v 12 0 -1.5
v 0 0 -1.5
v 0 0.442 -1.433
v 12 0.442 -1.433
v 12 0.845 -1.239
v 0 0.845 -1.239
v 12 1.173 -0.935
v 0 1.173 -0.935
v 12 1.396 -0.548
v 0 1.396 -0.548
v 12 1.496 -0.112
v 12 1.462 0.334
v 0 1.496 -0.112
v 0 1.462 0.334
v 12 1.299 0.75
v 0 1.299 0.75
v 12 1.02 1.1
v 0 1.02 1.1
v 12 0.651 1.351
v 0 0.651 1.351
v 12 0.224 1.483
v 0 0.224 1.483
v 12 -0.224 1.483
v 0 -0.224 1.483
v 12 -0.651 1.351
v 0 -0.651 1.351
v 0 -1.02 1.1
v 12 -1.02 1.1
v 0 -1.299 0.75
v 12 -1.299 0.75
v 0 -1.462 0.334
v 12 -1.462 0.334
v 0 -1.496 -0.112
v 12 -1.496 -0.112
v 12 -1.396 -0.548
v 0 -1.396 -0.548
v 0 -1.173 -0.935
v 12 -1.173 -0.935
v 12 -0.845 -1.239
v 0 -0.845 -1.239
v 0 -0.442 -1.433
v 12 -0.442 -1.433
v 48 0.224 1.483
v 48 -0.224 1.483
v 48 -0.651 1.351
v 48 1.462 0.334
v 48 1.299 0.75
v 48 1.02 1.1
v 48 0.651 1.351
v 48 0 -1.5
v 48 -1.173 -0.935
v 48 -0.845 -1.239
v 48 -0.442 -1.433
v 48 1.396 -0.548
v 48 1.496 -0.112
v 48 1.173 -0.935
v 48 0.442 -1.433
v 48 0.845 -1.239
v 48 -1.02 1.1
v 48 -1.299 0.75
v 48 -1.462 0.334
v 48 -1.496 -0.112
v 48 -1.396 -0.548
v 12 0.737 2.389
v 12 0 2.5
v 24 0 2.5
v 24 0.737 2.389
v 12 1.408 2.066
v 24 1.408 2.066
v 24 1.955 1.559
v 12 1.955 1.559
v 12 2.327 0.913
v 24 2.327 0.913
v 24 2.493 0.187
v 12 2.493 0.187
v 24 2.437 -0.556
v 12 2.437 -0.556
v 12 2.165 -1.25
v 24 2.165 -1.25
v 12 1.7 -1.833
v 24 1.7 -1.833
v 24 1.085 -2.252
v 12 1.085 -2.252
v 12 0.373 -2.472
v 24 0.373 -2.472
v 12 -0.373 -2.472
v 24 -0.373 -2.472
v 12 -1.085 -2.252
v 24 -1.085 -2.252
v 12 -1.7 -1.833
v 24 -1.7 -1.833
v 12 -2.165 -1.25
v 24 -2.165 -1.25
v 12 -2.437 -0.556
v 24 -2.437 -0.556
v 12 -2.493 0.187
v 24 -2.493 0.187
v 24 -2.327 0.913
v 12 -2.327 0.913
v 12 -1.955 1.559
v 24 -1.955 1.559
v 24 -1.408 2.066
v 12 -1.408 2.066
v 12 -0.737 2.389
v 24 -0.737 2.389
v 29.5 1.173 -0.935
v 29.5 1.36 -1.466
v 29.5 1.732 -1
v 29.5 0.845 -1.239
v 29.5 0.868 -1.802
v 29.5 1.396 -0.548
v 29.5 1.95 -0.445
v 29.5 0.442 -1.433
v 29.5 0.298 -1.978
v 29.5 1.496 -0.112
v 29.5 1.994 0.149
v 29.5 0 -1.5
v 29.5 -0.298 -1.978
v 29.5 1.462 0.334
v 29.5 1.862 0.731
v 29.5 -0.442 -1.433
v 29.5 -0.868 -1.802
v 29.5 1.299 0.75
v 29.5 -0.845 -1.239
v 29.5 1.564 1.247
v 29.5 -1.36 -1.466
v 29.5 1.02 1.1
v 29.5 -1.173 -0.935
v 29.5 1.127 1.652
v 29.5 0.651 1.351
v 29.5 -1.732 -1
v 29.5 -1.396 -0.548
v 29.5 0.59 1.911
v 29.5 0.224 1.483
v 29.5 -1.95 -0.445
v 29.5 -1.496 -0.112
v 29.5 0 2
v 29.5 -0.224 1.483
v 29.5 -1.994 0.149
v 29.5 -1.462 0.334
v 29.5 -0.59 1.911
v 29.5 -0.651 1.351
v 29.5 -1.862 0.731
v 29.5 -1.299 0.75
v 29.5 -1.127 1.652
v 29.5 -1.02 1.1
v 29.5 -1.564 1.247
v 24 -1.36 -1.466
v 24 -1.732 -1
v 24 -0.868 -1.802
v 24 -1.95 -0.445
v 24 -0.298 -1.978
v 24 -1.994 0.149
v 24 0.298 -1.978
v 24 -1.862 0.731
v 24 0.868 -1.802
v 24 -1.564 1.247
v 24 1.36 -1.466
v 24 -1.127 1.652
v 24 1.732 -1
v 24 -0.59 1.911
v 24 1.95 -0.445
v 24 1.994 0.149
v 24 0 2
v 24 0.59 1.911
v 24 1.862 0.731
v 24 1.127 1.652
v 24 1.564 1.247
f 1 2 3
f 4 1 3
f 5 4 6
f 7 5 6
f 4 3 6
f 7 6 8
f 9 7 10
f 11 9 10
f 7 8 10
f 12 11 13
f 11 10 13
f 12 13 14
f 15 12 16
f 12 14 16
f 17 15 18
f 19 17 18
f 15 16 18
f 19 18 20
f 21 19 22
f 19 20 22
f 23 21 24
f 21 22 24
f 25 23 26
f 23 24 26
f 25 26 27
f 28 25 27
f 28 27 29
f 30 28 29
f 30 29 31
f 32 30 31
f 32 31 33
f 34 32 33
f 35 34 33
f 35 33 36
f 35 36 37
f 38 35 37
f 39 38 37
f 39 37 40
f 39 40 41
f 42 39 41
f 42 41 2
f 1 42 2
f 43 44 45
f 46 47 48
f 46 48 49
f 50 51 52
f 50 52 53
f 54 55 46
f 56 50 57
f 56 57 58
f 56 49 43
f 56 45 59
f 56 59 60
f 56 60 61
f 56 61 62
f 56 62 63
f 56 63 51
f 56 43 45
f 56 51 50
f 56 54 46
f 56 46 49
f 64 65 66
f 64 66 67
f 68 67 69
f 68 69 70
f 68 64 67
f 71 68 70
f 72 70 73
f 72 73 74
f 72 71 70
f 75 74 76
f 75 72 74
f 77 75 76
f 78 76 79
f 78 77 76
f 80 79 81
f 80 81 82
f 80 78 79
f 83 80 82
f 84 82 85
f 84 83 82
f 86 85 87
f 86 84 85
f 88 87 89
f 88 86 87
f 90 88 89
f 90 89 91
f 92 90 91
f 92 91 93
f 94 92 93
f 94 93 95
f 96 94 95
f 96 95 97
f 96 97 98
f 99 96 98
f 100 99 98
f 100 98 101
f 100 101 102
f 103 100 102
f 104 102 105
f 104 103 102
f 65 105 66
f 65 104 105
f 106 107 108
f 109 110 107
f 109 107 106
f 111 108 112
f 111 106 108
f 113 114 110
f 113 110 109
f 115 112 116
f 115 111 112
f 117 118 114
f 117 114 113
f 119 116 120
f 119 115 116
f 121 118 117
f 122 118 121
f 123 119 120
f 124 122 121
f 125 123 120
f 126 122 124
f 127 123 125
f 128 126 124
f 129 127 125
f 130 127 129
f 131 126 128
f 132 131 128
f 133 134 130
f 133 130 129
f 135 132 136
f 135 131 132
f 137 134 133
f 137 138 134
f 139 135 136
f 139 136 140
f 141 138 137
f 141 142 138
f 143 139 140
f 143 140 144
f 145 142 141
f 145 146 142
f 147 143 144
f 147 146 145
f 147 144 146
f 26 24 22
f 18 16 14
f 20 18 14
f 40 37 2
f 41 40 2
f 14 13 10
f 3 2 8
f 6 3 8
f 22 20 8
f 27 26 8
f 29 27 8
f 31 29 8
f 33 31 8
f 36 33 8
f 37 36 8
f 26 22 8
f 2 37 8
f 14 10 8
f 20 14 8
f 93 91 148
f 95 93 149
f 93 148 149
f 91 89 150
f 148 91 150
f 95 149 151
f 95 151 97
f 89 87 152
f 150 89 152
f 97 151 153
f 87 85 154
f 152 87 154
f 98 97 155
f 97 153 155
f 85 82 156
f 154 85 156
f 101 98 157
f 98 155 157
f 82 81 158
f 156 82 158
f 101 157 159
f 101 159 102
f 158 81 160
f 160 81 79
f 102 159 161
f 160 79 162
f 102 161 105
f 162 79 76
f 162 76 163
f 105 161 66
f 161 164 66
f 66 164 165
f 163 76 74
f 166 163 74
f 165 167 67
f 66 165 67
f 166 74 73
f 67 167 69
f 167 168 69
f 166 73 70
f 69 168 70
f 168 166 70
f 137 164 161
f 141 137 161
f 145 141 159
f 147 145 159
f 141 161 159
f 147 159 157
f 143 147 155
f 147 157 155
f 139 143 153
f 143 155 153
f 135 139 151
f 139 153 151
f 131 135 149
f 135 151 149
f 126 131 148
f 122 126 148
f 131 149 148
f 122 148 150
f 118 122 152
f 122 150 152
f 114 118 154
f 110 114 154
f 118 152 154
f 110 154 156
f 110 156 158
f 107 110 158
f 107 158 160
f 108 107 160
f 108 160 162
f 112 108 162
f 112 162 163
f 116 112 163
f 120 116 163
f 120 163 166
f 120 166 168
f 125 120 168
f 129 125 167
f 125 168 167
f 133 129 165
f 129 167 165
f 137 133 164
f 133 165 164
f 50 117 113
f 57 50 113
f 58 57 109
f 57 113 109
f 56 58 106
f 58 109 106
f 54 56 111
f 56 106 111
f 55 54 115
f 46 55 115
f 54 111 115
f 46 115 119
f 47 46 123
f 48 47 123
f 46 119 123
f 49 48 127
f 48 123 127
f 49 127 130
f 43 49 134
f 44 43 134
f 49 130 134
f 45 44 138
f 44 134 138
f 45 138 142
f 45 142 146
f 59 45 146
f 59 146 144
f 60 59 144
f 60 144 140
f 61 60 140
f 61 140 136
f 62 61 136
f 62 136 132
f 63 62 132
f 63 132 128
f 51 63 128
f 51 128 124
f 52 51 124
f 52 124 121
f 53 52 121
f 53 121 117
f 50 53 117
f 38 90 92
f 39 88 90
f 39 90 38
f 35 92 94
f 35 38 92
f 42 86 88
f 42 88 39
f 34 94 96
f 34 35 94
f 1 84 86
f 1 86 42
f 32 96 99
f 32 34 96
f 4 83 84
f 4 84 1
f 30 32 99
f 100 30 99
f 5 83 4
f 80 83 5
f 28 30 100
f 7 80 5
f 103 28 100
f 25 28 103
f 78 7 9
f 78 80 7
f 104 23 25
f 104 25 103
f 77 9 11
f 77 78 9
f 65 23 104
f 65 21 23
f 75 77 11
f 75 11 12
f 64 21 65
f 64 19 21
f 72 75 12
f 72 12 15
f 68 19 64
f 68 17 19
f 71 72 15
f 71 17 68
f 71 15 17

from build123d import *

# Parameters (mm, degrees)
SKETCH_1_R      = 1.5
EXTRUDE_1_DEPTH = 48
EXTRUDE_START   = -12
SKETCH_2_R      = 2.5
SKETCH_2_R_2    = 1.5
EXTRUDE_2_DEPTH = 12
EXTRUDE_START_2 = 24
SKETCH_3_R      = 2
SKETCH_3_R_2    = 1.5
EXTRUDE_3_DEPTH = 5.5


with BuildPart() as part:
    # 草图1 → 凸台-拉伸1 (new body)
    with BuildSketch(Plane(origin=(0, 0, 0), x_dir=(0, 0, -1), z_dir=(1, 0, 0))):
        Circle(SKETCH_1_R)
    extrude(amount=EXTRUDE_1_DEPTH)

    # 草图2 → 凸台-拉伸2 (add)
    with BuildSketch(Plane.ZY.offset(EXTRUDE_START)):
        Circle(SKETCH_2_R)
        Circle(SKETCH_2_R_2, mode=Mode.SUBTRACT)
    extrude(amount=-EXTRUDE_2_DEPTH)

    # 草图3 → 凸台-拉伸3 (add)
    with BuildSketch(Plane(origin=(0, 0, 0), x_dir=(0, 0, -1), z_dir=(1, 0, 0)).offset(EXTRUDE_START_2)):
        with Locations(Location((0, 0, 0), (0, 0, 180))):
            Circle(SKETCH_3_R)
        with Locations(Location((0, 0, 0), (0, 0, 180))):
            Circle(SKETCH_3_R_2, mode=Mode.SUBTRACT)
    extrude(amount=EXTRUDE_3_DEPTH)


solid = part.part
